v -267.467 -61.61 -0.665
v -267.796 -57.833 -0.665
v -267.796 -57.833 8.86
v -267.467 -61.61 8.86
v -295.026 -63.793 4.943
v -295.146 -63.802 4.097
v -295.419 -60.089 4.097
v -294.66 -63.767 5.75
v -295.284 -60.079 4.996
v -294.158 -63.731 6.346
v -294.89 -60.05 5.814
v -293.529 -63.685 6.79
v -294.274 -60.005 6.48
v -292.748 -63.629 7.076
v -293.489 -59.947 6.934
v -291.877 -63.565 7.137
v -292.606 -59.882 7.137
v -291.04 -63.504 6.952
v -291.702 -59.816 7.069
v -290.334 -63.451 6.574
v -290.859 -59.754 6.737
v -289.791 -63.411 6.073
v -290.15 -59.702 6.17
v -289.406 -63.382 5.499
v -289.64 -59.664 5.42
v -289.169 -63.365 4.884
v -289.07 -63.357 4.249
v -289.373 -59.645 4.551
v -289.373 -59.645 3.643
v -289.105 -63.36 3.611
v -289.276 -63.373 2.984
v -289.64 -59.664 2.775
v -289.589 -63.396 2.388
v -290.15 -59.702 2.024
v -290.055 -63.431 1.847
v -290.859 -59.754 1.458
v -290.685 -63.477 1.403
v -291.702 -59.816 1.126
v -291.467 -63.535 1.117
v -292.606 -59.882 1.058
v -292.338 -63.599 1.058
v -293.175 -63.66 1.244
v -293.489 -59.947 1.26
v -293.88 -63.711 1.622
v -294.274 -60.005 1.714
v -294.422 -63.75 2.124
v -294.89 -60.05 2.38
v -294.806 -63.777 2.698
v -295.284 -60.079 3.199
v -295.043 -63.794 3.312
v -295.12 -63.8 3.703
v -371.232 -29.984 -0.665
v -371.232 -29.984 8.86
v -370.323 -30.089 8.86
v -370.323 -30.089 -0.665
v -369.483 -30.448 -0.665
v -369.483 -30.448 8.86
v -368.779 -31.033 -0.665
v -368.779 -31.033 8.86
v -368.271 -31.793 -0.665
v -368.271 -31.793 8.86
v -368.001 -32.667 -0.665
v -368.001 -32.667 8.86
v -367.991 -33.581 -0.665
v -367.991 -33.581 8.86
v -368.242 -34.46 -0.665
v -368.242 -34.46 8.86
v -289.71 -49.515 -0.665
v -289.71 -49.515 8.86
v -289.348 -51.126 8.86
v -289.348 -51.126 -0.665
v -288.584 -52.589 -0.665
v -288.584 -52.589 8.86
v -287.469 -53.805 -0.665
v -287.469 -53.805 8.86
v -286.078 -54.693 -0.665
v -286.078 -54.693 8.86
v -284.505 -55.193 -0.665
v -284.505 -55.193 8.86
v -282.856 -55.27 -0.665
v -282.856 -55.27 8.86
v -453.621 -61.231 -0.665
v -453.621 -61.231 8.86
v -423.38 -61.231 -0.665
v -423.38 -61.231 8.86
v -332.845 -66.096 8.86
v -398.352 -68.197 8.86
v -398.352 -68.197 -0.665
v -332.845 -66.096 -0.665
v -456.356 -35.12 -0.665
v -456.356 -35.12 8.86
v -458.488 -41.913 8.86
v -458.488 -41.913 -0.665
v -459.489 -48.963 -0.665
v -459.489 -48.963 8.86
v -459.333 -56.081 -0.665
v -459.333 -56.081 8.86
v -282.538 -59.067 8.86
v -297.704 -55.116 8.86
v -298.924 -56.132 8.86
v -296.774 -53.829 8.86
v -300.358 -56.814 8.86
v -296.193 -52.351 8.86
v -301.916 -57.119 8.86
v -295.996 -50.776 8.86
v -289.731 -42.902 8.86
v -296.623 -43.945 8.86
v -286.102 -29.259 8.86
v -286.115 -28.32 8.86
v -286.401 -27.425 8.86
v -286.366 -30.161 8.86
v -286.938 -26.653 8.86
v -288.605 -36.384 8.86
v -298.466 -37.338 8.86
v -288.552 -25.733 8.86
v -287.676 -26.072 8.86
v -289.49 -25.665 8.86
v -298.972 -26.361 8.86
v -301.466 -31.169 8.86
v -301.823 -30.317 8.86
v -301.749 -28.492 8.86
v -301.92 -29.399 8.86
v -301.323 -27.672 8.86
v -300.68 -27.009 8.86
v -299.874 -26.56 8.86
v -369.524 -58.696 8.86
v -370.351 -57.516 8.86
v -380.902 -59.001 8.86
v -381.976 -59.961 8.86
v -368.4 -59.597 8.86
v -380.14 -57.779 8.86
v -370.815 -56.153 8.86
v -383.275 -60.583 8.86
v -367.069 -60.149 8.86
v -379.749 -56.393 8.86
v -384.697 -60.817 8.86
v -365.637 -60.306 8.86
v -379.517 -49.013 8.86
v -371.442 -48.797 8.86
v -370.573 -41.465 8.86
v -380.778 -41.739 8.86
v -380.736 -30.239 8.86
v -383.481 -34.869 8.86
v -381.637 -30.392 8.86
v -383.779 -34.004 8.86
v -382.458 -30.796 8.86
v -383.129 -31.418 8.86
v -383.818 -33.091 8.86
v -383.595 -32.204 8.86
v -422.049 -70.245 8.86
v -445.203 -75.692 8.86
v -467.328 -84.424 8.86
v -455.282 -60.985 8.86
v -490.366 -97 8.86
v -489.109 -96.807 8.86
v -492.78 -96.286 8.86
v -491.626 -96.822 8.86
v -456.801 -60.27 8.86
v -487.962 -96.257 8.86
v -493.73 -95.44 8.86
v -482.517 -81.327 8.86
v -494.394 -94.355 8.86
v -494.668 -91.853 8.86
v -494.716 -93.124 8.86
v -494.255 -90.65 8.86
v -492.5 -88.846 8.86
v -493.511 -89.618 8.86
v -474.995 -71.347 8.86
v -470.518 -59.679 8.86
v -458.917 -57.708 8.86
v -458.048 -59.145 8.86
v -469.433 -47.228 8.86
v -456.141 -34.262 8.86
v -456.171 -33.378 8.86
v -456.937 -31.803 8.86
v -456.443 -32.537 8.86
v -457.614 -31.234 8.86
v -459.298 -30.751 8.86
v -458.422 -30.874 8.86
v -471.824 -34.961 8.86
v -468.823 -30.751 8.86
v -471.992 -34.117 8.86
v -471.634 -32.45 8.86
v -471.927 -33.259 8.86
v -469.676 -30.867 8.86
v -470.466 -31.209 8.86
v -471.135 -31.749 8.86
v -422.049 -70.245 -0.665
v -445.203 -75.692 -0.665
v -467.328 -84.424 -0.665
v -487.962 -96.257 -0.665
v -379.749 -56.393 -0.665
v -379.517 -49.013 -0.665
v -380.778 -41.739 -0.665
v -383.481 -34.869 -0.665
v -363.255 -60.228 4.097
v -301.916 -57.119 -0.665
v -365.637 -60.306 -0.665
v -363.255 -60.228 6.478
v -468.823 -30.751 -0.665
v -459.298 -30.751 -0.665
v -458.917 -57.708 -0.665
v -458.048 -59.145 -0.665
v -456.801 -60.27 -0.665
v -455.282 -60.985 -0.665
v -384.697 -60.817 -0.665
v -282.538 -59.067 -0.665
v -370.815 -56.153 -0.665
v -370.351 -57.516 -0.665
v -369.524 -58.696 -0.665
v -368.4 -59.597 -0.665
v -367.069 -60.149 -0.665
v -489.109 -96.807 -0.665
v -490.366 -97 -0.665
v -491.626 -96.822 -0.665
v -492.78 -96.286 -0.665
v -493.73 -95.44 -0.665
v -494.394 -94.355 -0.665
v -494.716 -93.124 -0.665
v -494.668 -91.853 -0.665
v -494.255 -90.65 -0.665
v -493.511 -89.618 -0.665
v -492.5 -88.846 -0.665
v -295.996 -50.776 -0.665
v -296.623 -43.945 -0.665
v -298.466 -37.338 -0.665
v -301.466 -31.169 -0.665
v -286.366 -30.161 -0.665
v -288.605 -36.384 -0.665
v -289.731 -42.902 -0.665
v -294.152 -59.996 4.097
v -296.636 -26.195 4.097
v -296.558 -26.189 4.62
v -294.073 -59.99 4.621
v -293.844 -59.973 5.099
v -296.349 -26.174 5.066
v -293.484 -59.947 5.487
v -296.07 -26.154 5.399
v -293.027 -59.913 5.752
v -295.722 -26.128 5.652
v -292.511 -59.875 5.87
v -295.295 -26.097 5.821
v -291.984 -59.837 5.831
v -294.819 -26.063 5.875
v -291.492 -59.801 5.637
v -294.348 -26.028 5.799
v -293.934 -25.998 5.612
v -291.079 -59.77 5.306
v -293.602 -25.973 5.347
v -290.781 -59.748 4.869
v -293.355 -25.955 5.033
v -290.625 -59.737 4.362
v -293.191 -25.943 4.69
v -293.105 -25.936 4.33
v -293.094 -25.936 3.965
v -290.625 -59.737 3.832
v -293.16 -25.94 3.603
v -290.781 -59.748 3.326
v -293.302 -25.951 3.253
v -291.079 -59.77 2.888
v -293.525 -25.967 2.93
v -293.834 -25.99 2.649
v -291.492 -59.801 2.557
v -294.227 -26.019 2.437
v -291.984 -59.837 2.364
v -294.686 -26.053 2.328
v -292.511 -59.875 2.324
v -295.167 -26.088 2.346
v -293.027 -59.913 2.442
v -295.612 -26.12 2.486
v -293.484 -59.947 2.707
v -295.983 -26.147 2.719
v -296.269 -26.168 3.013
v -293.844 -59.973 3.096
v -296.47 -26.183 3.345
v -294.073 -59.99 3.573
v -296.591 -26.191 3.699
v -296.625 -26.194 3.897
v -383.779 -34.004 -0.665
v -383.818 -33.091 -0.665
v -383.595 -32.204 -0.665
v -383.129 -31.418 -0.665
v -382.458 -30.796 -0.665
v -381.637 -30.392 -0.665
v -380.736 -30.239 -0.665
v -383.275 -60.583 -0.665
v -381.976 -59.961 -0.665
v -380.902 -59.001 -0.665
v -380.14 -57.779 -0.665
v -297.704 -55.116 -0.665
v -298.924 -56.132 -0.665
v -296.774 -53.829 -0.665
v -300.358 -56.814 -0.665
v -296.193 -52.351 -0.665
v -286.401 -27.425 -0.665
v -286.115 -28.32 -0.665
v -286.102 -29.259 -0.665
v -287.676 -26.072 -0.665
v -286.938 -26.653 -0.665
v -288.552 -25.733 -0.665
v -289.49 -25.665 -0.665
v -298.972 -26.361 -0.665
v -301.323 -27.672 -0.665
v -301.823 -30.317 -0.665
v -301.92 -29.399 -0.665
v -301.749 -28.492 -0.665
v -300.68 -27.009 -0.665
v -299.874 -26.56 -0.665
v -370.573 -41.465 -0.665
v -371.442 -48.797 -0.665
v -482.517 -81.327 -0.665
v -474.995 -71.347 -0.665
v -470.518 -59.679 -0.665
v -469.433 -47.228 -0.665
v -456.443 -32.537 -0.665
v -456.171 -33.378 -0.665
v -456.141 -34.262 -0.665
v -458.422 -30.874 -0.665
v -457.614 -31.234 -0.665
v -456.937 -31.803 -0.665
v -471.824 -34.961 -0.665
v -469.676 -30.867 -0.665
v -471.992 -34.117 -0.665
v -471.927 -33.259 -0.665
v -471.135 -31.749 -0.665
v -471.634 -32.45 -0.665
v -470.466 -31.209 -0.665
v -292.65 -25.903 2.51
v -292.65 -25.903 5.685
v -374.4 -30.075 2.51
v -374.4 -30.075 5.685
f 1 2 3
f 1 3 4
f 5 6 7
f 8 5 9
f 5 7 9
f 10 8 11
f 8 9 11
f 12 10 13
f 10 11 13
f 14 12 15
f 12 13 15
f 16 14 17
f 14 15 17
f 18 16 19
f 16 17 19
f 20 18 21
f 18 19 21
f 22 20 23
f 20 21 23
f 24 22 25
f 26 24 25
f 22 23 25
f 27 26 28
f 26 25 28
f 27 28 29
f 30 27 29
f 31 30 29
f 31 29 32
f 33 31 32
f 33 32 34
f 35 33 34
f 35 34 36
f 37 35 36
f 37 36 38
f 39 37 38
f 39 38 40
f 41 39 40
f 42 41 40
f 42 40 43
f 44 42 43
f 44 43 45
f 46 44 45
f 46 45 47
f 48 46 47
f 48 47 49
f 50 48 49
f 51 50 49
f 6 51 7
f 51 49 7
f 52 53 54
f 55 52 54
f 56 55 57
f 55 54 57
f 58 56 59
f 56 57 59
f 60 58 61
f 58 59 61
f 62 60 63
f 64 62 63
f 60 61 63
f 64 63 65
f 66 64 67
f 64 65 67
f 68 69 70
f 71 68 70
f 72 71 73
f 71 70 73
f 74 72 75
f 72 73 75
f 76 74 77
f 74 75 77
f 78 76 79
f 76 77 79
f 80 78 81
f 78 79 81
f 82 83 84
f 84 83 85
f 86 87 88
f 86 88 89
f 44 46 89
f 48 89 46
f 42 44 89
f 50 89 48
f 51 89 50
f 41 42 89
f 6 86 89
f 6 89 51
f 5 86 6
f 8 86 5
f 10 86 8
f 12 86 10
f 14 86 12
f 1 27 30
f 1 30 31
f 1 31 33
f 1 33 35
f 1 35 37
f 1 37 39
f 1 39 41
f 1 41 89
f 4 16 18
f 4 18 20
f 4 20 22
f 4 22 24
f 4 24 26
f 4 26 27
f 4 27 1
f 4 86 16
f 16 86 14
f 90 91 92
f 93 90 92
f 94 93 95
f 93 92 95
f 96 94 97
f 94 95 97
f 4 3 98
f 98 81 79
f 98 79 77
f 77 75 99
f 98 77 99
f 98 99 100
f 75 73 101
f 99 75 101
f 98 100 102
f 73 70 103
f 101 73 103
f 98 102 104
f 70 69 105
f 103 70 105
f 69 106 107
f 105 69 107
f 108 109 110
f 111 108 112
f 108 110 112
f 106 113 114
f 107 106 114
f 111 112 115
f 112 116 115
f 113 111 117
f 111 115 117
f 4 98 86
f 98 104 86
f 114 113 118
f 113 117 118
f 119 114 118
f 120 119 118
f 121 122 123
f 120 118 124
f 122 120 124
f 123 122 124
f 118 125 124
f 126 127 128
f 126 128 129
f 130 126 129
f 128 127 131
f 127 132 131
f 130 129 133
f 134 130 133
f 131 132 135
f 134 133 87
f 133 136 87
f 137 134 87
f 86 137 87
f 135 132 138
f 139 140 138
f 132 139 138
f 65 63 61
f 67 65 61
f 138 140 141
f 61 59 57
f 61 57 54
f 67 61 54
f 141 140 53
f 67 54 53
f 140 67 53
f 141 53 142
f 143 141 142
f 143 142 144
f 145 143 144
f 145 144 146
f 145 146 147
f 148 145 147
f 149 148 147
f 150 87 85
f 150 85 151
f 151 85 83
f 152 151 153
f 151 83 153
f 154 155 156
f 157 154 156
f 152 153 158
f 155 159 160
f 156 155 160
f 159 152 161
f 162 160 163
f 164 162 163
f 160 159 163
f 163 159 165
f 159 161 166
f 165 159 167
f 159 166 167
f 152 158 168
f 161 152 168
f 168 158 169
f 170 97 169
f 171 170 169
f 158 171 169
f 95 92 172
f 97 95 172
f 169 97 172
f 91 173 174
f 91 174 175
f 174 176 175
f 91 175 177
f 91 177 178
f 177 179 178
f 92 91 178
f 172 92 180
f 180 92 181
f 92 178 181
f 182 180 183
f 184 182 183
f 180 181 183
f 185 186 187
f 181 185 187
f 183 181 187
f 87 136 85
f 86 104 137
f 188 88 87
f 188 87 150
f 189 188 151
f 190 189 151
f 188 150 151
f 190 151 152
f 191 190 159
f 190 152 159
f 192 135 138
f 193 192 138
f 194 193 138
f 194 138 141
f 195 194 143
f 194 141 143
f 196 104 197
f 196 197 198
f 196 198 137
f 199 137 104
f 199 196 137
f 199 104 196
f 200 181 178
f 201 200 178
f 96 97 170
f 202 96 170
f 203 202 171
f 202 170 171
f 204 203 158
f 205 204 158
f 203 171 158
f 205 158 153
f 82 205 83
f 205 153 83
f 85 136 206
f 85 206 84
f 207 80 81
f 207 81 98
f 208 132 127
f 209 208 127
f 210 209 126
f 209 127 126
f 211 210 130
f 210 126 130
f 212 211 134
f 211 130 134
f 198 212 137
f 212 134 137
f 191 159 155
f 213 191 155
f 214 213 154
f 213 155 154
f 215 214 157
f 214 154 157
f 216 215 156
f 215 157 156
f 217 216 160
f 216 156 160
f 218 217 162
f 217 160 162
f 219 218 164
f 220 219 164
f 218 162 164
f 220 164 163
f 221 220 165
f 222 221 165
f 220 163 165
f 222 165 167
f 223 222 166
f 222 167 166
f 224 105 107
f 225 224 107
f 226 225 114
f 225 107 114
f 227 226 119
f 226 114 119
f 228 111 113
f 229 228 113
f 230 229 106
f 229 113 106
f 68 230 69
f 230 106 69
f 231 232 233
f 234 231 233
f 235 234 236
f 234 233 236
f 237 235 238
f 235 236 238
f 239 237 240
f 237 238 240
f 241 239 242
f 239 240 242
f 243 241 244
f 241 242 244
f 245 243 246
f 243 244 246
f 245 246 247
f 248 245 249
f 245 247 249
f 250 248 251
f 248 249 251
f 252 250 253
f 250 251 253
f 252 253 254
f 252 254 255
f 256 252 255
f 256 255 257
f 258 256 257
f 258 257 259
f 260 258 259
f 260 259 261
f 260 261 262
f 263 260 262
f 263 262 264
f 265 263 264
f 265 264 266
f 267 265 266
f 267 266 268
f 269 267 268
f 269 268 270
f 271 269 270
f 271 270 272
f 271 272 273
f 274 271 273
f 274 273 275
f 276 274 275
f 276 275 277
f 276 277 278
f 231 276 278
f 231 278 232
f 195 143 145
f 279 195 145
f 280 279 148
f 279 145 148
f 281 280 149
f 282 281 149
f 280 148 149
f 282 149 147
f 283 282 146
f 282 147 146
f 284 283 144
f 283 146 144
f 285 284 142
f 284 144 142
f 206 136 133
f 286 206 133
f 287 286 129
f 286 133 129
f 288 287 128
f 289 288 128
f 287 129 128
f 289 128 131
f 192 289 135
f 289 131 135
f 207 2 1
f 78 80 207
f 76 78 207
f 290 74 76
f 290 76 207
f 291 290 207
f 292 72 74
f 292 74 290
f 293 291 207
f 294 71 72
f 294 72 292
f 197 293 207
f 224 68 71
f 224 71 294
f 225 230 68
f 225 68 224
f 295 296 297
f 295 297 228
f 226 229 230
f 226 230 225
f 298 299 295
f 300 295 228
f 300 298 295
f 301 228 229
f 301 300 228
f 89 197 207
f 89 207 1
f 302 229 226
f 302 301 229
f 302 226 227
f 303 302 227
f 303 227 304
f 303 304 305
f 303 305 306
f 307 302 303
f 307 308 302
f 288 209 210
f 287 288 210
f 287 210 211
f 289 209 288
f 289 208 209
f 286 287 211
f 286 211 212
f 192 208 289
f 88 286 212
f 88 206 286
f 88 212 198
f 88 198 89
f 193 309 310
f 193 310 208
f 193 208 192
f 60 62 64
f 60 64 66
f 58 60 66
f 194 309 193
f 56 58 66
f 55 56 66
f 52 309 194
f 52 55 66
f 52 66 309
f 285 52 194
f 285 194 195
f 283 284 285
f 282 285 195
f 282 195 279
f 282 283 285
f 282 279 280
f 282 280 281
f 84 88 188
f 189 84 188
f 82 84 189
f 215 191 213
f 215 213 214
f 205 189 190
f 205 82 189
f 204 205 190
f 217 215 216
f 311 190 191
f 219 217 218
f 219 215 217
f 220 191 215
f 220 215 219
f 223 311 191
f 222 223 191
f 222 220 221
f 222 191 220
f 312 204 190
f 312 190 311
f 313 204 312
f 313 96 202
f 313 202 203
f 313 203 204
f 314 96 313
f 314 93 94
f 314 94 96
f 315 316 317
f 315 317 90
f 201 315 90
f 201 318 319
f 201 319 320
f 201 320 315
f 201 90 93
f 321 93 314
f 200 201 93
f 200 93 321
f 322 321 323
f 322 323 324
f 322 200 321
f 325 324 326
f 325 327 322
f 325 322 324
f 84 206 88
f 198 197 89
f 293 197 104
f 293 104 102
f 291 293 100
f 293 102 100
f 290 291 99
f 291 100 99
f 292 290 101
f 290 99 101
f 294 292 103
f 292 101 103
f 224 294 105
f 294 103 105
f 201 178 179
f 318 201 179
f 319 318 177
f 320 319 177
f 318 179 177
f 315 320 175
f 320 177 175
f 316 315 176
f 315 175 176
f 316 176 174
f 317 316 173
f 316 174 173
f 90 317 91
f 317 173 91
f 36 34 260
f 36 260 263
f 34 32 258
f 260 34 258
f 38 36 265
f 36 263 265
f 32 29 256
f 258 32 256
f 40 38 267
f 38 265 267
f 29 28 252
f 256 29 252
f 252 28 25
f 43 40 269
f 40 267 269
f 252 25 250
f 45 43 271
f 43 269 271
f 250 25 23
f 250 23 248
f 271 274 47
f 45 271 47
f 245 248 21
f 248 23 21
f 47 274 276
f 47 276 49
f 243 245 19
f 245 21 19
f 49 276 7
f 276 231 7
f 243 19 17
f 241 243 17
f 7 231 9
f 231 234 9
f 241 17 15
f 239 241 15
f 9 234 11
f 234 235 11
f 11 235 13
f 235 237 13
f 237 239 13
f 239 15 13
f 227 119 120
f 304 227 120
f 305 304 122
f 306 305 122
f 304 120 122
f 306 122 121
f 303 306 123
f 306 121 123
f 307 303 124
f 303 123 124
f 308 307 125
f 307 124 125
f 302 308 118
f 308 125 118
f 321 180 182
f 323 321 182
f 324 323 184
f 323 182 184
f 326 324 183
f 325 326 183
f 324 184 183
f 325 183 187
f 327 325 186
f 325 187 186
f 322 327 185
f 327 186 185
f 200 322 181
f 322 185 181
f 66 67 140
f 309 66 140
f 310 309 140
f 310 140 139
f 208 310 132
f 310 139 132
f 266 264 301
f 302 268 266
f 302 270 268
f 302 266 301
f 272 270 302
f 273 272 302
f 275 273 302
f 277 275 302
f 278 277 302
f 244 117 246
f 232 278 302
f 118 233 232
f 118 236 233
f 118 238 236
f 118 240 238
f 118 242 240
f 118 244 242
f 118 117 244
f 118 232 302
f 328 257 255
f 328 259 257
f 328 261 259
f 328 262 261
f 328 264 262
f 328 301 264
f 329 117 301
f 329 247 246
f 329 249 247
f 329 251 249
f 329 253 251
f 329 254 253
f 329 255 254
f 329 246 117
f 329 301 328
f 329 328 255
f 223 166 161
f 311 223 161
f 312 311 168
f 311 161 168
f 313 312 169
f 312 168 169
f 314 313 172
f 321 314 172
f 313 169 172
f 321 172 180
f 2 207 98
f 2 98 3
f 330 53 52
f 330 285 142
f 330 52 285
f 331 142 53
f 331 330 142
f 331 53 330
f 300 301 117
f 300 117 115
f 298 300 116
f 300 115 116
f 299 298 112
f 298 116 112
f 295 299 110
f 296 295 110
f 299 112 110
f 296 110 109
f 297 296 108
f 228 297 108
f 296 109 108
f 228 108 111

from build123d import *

# Parameters (mm, degrees)
BOSS_EXTRUDE5_DEPTH = 4.7625
SKETCH6_R           = 1.778
CUT_EXTRUDE3_DEPTH  = 504.733086563
CUT_EXTRUDE4_START  = 3.556
SKETCH7_R           = 3.048
SKETCH7_R_2         = 1.778
CUT_EXTRUDE4_DEPTH  = 505.502600354
CUT_EXTRUDE5_DEPTH  = 506.075936751


with BuildPart() as part:
    # Sketch1 → Boss-Extrude5 (new, symmetric)
    with BuildSketch(Plane(origin=(0, 0, 4.097149242), x_dir=(-1, 0, 0), z_dir=(0, 0, -1))):
        with BuildLine():
            Line((4.980483945, -43.087244707), (5.013364858, -50.687454907))
            add(Edge.make_bspline(
                [(266.801551376, -61.551589611), (261.350884009, -61.078554924), (250.433518448, -60.153958667), (228.701217873, -58.434486699), (190.548987698, -55.763104255), (136.042529388, -52.86929541), (81.4824687, -51.236835025), (43.240954482, -50.737883821), (21.43842692, -50.650632415), (10.483916541, -50.667450636), (5.013364858, -50.687454907)],
                knots=[4.0417e-05, 4.0417e-05, 4.0417e-05, 4.0417e-05, 0.062531963, 0.125023508, 0.2500066, 0.499972783, 0.749938966, 0.874922057, 0.937413603, 0.999905149, 0.999905149, 0.999905149, 0.999905149], degree=3))
            add(Edge.make_bspline(
                [(398.35171036, -68.196818162), (396.265786035, -68.16801087), (352.35609282, -67.485074441), (308.459309619, -65.190615284), (266.801551376, -61.551589611)],
                knots=[0.388247103, 0.388247103, 0.388247103, 0.388247103, 0.401472843, 0.666666775, 0.666666775, 0.666666775, 0.666666775], degree=3))
            ThreePointArc((398.35171036, -68.196818162), (445.202941045, -75.692238551), (487.961522574, -96.257326662))
            ThreePointArc((487.961522574, -96.257326662), (494.102034598, -94.922101367), (492.499924864, -88.845757162))
            ThreePointArc((492.499924864, -88.845757162), (472.347982204, -65.669309605), (471.824439099, -34.961421092))
            ThreePointArc((471.824439099, -34.961421092), (471.408544547, -32.082865726), (468.823110549, -30.750731982))
            Line((468.823110549, -30.750731982), (464.060610549, -30.750731982))
            Line((464.060610549, -30.750731982), (459.298110549, -30.750731982))
            ThreePointArc((459.298110549, -30.750731982), (456.664489609, -32.15241144), (456.356218194, -35.119840174))
            ThreePointArc((456.356218194, -35.119840174), (459.13228847, -45.417631786), (459.332762362, -56.081162557))
            ThreePointArc((459.332762362, -56.081162557), (457.466080253, -59.753283819), (453.620807365, -61.230731982))
            Line((453.620807365, -61.230731985), (423.379813153, -61.230732209))
            add(Edge.make_bspline(
                [(384.69669435, -60.817291115), (385.490946639, -60.834366328), (398.38358415, -61.102948795), (411.282715888, -61.232192999), (423.379813153, -61.230732209)],
                knots=[0.584578013, 0.584578013, 0.584578013, 0.584578013, 0.589634714, 0.666658831, 0.666658831, 0.666658831, 0.666658831], degree=3))
            ThreePointArc((384.69669435, -60.817291115), (381.405012075, -59.519394431), (379.749008052, -56.392517605))
            ThreePointArc((379.749008052, -56.392517605), (379.962938882, -45.344267983), (383.481055682, -34.868942675))
            ThreePointArc((383.481055682, -34.868942675), (383.390574332, -31.793909155), (380.736068027, -30.23904122))
            add(Edge.make_bspline(
                [(380.736068027, -30.23904122), (377.567706075, -30.162607104), (374.399550345, -30.077611409), (371.231646974, -29.984054972)],
                knots=[0.564351213, 0.564351213, 0.564351213, 0.564351213, 0.584873669, 0.584873669, 0.584873669, 0.584873669], degree=3))
            ThreePointArc((371.231646974, -29.984054972), (368.497589908, -31.394357521), (368.242362423, -34.460116848))
            ThreePointArc((368.242362423, -34.460116848), (371.193755284, -45.109007001), (370.814996242, -56.152834368))
            ThreePointArc((370.814996242, -56.152834368), (368.993717842, -59.186422224), (365.637179655, -60.305958598))
            add(Edge.make_bspline(
                [(301.916083239, -57.118764264), (304.793492849, -57.314159562), (316.447125042, -58.077219349), (336.889920622, -59.214945623), (355.259103098, -59.96581465), (364.843153628, -60.280423029), (365.637179655, -60.305958598)],
                knots=[0.408750601, 0.408750601, 0.408750601, 0.408750601, 0.427107919, 0.483087827, 0.539067736, 0.544124431, 0.544124431, 0.544124431, 0.544124431], degree=3))
            ThreePointArc((301.916083239, -57.118764264), (297.703900514, -55.115863145), (295.996304567, -50.7755622))
            ThreePointArc((295.996304567, -50.7755622), (297.395526272, -40.599539879), (301.466201974, -31.168800195))
            ThreePointArc((301.466201974, -31.168800195), (301.565948035, -28.066269557), (298.971867926, -26.361454603))
            add(Edge.make_bspline(
                [(289.489598636, -25.664595471), (292.649719638, -25.90542225), (295.810491414, -26.137709697), (298.971867926, -26.361454603)],
                knots=[0.377389823, 0.377389823, 0.377389823, 0.377389823, 0.397912285, 0.397912285, 0.397912285, 0.397912285], degree=3))
            ThreePointArc((289.489598636, -25.664595471), (286.640803233, -27.018955044), (286.365734252, -30.161288915))
            ThreePointArc((286.365734252, -30.161288915), (289.309950073, -39.618561113), (289.709550194, -49.515465879))
            ThreePointArc((289.709550194, -49.515465879), (287.468803622, -53.805389908), (282.855937937, -55.270266537))
            Line((282.855937937, -55.270266537), (268.113256948, -54.036580381))
            add(Edge.make_bspline(
                [(268.113256948, -54.036580381), (262.634745624, -53.56111419), (251.663313863, -52.628696852), (229.81175043, -50.89541865), (191.471827261, -48.203857237), (136.679597141, -45.286916485), (81.835702382, -43.641470214), (43.402846546, -43.138474088), (21.480818831, -43.050269737), (10.476996172, -43.067138198), (4.980483945, -43.087244707)],
                knots=[-0.002434158, -0.002434158, -0.002434158, -0.002434158, 0.060213256, 0.12286067, 0.248155497, 0.498745152, 0.749334808, 0.874629635, 0.937277049, 0.999924463, 0.999924463, 0.999924463, 0.999924463], degree=3))
        make_face()
    boss_extrude5 = extrude(amount=BOSS_EXTRUDE5_DEPTH, both=True)

    # Sketch6 → Cut-Extrude3 (cut, through all)
    with BuildSketch(Plane(origin=(0.32087569, -4.366204823, 0), x_dir=(0.9973104440526221, 0.07329309778936742, 0), z_dir=(-0.07329309778936742, 0.9973104440526221, 0))):
        with Locations((-295.980145151, -4.097149242)):
            Circle(SKETCH6_R)
    cut_extrude3 = extrude(amount=-CUT_EXTRUDE3_DEPTH, mode=Mode.SUBTRACT)

    # Sketch7 → Cut-Extrude4 (cut)
    with BuildSketch(Plane(origin=(3.065947832, -41.718823267, 0), x_dir=(-0.9946544730103679, -0.07309790847145088, 0.07293267510222654), z_dir=(-0.07329309778936742, 0.9973104440526221, 0)).offset(CUT_EXTRUDE4_START)):
        with Locations((295.490726509, -17.500385777)):
            Circle(SKETCH7_R)
        with Locations((295.490726509, -17.500385777)):
            Circle(SKETCH7_R_2, mode=Mode.SUBTRACT)
    cut_extrude4 = extrude(amount=-CUT_EXTRUDE4_DEPTH, mode=Mode.SUBTRACT)

    # Mirror4: Boss-Extrude5, Cut-Extrude3, Cut-Extrude4 across plane
    add(boss_extrude5.mirror(Plane(origin=(-4.793985166, 0.020740296, 8.859649242), x_dir=(0, 0, 1), z_dir=(-0.9999906416249494, 0.004326275825933448, 0))))
    add(cut_extrude3.mirror(Plane(origin=(-4.793985166, 0.020740296, 8.859649242), x_dir=(0, 0, 1), z_dir=(-0.9999906416249494, 0.004326275825933448, 0))), mode=Mode.SUBTRACT)
    add(cut_extrude4.mirror(Plane(origin=(-4.793985166, 0.020740296, 8.859649242), x_dir=(0, 0, 1), z_dir=(-0.9999906416249494, 0.004326275825933448, 0))), mode=Mode.SUBTRACT)

    # Sketch9 → Cut-Extrude5 (cut, through all)
    with BuildSketch(Plane(origin=(0, 0, -0.665350758), x_dir=(-1, 0, 0), z_dir=(0, 0, -1))):
        Polygon((282.855937937, -55.270266537), (268.113256948, -54.036580381), (271.226711866, -16.830462442), (-501.730233012, -16.830462442), (-501.730233012, -147.179806135), (267.467078991, -61.609602167), (267.795541806, -57.83331017), (282.538222795, -59.066996326), align=None)
    extrude(amount=-CUT_EXTRUDE5_DEPTH, mode=Mode.SUBTRACT)


solid = part.part
